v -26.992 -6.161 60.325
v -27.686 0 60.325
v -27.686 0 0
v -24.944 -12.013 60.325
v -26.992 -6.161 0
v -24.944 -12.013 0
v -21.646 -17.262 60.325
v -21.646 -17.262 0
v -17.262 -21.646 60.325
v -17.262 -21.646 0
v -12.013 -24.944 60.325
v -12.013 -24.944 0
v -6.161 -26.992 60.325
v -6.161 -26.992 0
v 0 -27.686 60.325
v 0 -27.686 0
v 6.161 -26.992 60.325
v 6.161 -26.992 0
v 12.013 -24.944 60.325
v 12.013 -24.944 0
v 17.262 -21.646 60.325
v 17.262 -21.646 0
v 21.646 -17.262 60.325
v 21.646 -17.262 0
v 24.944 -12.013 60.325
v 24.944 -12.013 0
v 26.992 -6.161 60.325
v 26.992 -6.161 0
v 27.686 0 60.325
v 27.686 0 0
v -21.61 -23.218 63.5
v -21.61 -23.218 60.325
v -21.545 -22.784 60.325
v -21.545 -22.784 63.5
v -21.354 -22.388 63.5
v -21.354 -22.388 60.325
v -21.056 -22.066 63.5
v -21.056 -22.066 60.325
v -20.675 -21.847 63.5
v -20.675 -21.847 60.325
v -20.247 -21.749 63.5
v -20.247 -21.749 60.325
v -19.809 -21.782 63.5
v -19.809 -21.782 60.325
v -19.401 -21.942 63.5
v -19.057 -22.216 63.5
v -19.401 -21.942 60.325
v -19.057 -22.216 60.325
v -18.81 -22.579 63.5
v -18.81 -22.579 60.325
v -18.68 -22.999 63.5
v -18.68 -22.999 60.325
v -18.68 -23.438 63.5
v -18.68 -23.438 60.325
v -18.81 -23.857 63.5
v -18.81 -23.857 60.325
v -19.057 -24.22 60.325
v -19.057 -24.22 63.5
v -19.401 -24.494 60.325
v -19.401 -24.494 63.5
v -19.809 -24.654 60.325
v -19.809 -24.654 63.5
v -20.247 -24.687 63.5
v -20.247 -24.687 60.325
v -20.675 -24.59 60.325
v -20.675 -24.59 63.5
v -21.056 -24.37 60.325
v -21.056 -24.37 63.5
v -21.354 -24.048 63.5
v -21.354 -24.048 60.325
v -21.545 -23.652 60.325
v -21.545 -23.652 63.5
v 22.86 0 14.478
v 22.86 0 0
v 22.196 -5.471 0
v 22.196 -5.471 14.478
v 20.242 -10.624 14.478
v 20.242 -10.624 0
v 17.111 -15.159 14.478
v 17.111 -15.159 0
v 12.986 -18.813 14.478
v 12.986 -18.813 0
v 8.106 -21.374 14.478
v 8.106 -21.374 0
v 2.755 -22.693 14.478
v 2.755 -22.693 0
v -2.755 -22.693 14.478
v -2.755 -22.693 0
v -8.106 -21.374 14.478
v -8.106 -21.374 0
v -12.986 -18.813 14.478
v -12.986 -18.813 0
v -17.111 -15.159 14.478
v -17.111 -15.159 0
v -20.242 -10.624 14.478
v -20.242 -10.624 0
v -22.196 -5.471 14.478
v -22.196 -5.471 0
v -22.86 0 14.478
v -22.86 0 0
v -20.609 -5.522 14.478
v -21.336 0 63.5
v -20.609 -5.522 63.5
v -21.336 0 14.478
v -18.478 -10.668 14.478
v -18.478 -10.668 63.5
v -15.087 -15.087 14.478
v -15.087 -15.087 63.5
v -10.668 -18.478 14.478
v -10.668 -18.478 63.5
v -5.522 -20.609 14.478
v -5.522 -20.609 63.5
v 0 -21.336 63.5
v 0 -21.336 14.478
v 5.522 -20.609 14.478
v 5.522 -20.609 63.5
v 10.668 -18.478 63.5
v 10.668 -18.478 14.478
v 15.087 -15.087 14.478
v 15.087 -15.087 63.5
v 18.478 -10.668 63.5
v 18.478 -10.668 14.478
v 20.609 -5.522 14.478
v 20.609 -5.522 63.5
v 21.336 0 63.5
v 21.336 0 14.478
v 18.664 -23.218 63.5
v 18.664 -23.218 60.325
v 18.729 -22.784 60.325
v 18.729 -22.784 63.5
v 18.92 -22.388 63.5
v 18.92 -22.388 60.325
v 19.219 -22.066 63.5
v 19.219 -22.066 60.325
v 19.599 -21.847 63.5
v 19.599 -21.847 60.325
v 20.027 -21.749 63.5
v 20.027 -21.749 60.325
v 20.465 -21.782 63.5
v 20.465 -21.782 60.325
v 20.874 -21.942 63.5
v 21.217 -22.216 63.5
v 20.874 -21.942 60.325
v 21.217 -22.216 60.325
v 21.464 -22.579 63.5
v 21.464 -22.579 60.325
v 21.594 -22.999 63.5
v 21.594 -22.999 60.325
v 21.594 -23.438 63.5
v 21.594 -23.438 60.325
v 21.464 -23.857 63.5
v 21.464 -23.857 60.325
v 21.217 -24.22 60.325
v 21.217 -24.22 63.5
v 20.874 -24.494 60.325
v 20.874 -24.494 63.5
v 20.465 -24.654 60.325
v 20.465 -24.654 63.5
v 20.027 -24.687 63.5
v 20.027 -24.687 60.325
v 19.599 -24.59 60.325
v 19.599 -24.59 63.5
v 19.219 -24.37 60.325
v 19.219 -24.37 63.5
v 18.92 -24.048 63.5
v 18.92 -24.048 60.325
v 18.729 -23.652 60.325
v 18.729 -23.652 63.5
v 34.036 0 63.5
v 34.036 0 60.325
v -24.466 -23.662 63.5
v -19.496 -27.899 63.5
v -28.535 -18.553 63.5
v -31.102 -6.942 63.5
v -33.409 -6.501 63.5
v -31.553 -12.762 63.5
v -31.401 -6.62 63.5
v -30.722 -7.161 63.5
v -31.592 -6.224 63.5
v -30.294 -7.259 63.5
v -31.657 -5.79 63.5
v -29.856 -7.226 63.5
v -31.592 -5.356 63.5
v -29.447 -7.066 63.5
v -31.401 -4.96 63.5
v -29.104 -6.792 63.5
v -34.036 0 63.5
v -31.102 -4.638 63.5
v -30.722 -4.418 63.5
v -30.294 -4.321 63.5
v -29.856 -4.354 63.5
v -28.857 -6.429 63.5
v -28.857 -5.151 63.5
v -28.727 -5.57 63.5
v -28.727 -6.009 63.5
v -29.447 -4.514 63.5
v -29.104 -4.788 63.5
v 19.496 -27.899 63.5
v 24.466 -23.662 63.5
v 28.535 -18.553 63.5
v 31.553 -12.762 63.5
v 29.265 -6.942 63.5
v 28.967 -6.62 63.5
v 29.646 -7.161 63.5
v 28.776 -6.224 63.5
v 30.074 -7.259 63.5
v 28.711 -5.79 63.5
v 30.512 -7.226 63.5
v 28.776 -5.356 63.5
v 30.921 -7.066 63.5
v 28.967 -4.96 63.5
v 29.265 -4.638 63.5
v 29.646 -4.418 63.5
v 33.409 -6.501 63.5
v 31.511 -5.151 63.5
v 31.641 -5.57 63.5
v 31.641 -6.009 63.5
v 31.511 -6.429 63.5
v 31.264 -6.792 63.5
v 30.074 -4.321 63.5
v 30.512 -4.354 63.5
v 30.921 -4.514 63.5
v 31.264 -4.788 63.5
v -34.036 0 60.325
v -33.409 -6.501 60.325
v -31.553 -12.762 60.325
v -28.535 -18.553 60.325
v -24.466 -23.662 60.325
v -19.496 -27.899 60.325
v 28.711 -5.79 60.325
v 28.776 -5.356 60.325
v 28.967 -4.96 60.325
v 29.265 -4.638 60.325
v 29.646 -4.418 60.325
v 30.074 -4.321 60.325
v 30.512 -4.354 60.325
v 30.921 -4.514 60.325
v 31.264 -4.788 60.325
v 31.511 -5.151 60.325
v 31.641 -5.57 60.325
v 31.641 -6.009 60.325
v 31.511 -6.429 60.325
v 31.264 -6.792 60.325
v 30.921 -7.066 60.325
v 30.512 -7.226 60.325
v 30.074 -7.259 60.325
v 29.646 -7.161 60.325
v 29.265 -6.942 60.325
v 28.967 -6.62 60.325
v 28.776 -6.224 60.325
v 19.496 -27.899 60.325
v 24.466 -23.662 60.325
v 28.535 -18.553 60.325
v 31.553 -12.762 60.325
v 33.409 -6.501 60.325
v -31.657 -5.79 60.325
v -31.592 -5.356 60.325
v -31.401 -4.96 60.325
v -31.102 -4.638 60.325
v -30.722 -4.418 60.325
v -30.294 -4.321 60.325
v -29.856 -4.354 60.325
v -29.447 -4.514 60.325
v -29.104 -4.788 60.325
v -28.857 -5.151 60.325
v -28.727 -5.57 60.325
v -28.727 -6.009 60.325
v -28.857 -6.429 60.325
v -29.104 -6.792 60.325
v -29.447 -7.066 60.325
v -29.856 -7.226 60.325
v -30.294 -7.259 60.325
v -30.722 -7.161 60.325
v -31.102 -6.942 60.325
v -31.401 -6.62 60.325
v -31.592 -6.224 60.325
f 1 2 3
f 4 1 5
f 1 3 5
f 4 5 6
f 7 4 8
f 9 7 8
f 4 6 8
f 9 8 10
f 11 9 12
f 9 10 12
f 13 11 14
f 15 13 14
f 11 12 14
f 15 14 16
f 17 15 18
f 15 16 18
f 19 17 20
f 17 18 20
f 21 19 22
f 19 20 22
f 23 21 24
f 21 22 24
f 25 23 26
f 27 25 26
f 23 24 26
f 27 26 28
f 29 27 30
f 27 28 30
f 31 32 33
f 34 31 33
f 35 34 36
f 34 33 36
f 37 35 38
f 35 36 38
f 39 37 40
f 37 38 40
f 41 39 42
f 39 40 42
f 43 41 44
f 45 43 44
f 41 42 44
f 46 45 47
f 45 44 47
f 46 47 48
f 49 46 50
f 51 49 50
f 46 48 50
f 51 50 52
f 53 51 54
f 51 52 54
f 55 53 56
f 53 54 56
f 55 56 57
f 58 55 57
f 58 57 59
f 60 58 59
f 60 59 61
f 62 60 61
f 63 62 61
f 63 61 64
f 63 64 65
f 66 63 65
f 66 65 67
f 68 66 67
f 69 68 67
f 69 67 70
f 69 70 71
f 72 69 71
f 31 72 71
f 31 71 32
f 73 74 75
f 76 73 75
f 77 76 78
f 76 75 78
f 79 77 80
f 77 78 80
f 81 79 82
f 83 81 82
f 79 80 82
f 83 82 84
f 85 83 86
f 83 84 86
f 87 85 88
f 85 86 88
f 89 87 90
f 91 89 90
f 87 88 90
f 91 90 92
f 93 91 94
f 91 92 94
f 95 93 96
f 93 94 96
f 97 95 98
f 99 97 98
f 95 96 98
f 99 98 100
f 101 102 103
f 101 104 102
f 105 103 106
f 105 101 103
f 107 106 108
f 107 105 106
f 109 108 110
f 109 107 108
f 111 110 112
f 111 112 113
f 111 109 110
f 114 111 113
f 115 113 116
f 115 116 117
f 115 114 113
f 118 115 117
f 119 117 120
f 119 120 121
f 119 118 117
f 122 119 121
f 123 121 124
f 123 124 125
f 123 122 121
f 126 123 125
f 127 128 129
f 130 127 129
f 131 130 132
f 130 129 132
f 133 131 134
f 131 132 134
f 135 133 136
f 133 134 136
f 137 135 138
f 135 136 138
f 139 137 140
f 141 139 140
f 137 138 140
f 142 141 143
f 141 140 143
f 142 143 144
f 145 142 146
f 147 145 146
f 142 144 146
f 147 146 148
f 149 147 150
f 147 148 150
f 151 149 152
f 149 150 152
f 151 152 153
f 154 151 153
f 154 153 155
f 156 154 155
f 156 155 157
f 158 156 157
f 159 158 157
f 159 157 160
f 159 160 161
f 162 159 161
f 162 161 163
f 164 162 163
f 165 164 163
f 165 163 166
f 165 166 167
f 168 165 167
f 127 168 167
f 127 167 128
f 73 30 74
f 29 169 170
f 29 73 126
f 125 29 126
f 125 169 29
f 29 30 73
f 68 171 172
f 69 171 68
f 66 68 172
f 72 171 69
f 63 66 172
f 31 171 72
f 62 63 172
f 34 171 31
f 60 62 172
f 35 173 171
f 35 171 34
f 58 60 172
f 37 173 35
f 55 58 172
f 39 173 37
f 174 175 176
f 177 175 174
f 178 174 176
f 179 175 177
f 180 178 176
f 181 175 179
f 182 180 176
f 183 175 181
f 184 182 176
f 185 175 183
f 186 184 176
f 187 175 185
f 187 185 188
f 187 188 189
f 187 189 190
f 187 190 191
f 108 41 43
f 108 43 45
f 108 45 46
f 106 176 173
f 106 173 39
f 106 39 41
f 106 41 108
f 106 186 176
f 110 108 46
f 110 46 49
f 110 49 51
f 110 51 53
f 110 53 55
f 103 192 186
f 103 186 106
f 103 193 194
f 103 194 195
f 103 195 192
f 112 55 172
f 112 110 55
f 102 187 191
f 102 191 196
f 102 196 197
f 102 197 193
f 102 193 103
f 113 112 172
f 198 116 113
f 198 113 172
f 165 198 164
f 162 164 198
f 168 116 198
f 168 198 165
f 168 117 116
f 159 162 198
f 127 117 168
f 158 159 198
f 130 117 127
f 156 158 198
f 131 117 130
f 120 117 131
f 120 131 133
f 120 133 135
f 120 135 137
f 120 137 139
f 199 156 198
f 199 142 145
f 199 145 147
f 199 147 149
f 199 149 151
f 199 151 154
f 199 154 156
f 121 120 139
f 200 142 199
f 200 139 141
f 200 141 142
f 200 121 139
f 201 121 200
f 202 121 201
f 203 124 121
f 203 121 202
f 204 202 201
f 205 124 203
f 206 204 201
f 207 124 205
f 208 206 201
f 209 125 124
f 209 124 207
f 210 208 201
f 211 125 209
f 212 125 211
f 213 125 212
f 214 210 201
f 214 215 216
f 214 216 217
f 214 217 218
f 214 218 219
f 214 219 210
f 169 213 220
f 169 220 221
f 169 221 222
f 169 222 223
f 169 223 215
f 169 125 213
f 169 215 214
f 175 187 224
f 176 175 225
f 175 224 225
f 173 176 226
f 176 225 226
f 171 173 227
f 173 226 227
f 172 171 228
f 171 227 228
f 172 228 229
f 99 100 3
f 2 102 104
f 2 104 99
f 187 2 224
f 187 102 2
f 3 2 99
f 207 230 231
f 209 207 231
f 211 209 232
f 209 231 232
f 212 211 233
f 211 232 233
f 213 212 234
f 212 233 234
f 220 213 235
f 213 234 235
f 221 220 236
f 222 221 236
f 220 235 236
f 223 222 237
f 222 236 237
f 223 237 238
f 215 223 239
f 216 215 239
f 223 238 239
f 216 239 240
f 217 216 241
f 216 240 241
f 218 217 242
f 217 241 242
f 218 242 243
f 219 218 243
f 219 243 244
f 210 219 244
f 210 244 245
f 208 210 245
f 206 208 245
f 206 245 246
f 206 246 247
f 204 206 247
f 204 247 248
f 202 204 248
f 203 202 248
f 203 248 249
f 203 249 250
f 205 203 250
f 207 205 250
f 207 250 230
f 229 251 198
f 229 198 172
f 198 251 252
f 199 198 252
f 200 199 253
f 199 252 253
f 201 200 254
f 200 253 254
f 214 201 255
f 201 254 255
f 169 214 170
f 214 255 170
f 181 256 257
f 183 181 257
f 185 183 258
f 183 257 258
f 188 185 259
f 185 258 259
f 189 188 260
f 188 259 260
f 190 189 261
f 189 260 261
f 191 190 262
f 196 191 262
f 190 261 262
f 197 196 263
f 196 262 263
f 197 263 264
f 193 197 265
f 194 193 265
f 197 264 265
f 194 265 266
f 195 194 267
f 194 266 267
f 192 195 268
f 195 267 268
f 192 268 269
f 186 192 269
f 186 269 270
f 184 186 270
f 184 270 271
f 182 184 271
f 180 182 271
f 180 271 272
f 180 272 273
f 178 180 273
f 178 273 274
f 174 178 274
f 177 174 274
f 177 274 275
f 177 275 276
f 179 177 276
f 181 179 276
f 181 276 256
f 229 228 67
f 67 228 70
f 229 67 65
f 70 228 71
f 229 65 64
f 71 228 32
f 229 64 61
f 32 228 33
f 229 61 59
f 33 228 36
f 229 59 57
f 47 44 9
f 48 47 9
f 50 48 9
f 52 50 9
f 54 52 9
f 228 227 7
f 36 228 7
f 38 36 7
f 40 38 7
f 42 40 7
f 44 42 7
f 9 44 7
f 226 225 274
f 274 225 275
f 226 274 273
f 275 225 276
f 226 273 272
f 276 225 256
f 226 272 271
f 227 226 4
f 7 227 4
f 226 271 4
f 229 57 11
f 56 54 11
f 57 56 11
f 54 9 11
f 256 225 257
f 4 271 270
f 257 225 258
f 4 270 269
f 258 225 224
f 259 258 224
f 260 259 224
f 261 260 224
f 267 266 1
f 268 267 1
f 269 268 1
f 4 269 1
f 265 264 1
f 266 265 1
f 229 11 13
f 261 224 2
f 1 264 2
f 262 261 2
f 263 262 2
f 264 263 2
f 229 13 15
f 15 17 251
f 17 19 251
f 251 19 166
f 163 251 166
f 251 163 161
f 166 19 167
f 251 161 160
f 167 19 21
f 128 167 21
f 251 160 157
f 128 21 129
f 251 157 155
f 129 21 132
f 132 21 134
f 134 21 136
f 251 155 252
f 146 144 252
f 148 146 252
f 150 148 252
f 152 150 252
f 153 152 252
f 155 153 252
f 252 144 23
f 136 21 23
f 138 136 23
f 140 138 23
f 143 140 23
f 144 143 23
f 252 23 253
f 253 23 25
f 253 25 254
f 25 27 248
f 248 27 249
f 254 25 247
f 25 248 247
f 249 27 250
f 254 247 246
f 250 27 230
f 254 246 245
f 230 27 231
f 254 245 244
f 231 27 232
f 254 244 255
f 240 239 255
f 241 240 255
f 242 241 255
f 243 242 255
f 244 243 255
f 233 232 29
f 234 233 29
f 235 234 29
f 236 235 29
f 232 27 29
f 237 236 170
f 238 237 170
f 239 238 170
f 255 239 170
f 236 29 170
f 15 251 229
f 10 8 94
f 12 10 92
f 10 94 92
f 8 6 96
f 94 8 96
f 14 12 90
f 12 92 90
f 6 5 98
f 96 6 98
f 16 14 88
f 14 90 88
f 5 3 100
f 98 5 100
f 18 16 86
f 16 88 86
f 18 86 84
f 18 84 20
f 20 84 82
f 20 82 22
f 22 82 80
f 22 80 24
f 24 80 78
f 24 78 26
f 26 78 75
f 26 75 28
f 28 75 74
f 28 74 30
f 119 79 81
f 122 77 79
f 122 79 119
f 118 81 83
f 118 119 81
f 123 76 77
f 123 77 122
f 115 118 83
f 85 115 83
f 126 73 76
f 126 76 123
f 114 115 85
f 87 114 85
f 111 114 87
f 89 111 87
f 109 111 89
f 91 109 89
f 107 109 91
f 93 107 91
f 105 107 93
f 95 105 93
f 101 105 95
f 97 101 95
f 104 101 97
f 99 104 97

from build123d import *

# Parameters (mm, degrees)
SKETCH1_R               = 27.686
SKETCH1_R_2             = 21.336
BOSS_EXTRUDE1_DEPTH     = 63.5
BOSS_EXTRUDE2_START     = -3.175
SKETCH2_R               = 34.036
SKETCH2_R_2             = 27.686
BOSS_EXTRUDE2_DEPTH     = 3.175
CUT_EXTRUDE1_DEPTH      = 101.6
CUT_EXTRUDE1_DEPTH_BACK = 101.6
SKETCH3_W               = 97.716171251
SKETCH3_H               = 43.59719505
SKETCH4_R               = 1.4732
CUT_EXTRUDE2_DEPTH      = 101.6
SKETCH5_W               = 45.490276776
SKETCH5_H               = 8.374778988
CUT_EXTRUDE3_DEPTH      = 101.6
SKETCH6_R               = 22.86
CUT_EXTRUDE4_DEPTH      = 14.478


with BuildPart() as part:
    # Sketch1 → Boss-Extrude1 (new body)
    with BuildSketch(Plane.XY):
        Circle(SKETCH1_R)
        Circle(SKETCH1_R_2, mode=Mode.SUBTRACT)
    extrude(amount=BOSS_EXTRUDE1_DEPTH)

    # Sketch2 → Boss-Extrude2 (add)
    with BuildSketch(Plane.XY.offset(63.5).offset(BOSS_EXTRUDE2_START)):
        Circle(SKETCH2_R)
        Circle(SKETCH2_R_2, mode=Mode.SUBTRACT)
    extrude(amount=BOSS_EXTRUDE2_DEPTH)

    # Sketch3 → Cut-Extrude1 (cut, two sides: drawn at the far end of the back side and taken through both)
    with BuildSketch(Plane(origin=(0, 0, 60.325), x_dir=(-1, 0, 0), z_dir=(0, 0, -1)).offset(-CUT_EXTRUDE1_DEPTH_BACK)):
        with Locations((3.507260384, 21.798597525)):
            Rectangle(SKETCH3_W, SKETCH3_H)
    extrude(amount=CUT_EXTRUDE1_DEPTH + CUT_EXTRUDE1_DEPTH_BACK, mode=Mode.SUBTRACT)

    # Sketch4 → Cut-Extrude2 (cut)
    with BuildSketch(Plane(origin=(0, 0, 60.325), x_dir=(-1, 0, 0), z_dir=(0, 0, -1))):
        with Locations((-30.183908954, -5.789782512)):
            Circle(SKETCH4_R)
        with Locations((30.183908954, -5.789782512)):
            Circle(SKETCH4_R)
        with Locations((-20.137167932, -23.218191337)):
            Circle(SKETCH4_R)
        with Locations((20.137167932, -23.218191337)):
            Circle(SKETCH4_R)
        with Locations((0, -30.734181969)):
            Circle(SKETCH4_R)
    extrude(amount=-CUT_EXTRUDE2_DEPTH, mode=Mode.SUBTRACT)

    # Sketch5 → Cut-Extrude3 (cut)
    with BuildSketch(Plane(origin=(0, 0, 60.325), x_dir=(-1, 0, 0), z_dir=(0, 0, -1))):
        with Locations((-0.190335886, -32.086257649)):
            Rectangle(SKETCH5_W, SKETCH5_H)
    extrude(amount=-CUT_EXTRUDE3_DEPTH, mode=Mode.SUBTRACT)

    # Sketch6 → Cut-Extrude4 (cut)
    with BuildSketch(Plane(origin=(0, 0, 0), x_dir=(-1, 0, 0), z_dir=(0, 0, -1))):
        Circle(SKETCH6_R)
    extrude(amount=-CUT_EXTRUDE4_DEPTH, mode=Mode.SUBTRACT)


solid = part.part
